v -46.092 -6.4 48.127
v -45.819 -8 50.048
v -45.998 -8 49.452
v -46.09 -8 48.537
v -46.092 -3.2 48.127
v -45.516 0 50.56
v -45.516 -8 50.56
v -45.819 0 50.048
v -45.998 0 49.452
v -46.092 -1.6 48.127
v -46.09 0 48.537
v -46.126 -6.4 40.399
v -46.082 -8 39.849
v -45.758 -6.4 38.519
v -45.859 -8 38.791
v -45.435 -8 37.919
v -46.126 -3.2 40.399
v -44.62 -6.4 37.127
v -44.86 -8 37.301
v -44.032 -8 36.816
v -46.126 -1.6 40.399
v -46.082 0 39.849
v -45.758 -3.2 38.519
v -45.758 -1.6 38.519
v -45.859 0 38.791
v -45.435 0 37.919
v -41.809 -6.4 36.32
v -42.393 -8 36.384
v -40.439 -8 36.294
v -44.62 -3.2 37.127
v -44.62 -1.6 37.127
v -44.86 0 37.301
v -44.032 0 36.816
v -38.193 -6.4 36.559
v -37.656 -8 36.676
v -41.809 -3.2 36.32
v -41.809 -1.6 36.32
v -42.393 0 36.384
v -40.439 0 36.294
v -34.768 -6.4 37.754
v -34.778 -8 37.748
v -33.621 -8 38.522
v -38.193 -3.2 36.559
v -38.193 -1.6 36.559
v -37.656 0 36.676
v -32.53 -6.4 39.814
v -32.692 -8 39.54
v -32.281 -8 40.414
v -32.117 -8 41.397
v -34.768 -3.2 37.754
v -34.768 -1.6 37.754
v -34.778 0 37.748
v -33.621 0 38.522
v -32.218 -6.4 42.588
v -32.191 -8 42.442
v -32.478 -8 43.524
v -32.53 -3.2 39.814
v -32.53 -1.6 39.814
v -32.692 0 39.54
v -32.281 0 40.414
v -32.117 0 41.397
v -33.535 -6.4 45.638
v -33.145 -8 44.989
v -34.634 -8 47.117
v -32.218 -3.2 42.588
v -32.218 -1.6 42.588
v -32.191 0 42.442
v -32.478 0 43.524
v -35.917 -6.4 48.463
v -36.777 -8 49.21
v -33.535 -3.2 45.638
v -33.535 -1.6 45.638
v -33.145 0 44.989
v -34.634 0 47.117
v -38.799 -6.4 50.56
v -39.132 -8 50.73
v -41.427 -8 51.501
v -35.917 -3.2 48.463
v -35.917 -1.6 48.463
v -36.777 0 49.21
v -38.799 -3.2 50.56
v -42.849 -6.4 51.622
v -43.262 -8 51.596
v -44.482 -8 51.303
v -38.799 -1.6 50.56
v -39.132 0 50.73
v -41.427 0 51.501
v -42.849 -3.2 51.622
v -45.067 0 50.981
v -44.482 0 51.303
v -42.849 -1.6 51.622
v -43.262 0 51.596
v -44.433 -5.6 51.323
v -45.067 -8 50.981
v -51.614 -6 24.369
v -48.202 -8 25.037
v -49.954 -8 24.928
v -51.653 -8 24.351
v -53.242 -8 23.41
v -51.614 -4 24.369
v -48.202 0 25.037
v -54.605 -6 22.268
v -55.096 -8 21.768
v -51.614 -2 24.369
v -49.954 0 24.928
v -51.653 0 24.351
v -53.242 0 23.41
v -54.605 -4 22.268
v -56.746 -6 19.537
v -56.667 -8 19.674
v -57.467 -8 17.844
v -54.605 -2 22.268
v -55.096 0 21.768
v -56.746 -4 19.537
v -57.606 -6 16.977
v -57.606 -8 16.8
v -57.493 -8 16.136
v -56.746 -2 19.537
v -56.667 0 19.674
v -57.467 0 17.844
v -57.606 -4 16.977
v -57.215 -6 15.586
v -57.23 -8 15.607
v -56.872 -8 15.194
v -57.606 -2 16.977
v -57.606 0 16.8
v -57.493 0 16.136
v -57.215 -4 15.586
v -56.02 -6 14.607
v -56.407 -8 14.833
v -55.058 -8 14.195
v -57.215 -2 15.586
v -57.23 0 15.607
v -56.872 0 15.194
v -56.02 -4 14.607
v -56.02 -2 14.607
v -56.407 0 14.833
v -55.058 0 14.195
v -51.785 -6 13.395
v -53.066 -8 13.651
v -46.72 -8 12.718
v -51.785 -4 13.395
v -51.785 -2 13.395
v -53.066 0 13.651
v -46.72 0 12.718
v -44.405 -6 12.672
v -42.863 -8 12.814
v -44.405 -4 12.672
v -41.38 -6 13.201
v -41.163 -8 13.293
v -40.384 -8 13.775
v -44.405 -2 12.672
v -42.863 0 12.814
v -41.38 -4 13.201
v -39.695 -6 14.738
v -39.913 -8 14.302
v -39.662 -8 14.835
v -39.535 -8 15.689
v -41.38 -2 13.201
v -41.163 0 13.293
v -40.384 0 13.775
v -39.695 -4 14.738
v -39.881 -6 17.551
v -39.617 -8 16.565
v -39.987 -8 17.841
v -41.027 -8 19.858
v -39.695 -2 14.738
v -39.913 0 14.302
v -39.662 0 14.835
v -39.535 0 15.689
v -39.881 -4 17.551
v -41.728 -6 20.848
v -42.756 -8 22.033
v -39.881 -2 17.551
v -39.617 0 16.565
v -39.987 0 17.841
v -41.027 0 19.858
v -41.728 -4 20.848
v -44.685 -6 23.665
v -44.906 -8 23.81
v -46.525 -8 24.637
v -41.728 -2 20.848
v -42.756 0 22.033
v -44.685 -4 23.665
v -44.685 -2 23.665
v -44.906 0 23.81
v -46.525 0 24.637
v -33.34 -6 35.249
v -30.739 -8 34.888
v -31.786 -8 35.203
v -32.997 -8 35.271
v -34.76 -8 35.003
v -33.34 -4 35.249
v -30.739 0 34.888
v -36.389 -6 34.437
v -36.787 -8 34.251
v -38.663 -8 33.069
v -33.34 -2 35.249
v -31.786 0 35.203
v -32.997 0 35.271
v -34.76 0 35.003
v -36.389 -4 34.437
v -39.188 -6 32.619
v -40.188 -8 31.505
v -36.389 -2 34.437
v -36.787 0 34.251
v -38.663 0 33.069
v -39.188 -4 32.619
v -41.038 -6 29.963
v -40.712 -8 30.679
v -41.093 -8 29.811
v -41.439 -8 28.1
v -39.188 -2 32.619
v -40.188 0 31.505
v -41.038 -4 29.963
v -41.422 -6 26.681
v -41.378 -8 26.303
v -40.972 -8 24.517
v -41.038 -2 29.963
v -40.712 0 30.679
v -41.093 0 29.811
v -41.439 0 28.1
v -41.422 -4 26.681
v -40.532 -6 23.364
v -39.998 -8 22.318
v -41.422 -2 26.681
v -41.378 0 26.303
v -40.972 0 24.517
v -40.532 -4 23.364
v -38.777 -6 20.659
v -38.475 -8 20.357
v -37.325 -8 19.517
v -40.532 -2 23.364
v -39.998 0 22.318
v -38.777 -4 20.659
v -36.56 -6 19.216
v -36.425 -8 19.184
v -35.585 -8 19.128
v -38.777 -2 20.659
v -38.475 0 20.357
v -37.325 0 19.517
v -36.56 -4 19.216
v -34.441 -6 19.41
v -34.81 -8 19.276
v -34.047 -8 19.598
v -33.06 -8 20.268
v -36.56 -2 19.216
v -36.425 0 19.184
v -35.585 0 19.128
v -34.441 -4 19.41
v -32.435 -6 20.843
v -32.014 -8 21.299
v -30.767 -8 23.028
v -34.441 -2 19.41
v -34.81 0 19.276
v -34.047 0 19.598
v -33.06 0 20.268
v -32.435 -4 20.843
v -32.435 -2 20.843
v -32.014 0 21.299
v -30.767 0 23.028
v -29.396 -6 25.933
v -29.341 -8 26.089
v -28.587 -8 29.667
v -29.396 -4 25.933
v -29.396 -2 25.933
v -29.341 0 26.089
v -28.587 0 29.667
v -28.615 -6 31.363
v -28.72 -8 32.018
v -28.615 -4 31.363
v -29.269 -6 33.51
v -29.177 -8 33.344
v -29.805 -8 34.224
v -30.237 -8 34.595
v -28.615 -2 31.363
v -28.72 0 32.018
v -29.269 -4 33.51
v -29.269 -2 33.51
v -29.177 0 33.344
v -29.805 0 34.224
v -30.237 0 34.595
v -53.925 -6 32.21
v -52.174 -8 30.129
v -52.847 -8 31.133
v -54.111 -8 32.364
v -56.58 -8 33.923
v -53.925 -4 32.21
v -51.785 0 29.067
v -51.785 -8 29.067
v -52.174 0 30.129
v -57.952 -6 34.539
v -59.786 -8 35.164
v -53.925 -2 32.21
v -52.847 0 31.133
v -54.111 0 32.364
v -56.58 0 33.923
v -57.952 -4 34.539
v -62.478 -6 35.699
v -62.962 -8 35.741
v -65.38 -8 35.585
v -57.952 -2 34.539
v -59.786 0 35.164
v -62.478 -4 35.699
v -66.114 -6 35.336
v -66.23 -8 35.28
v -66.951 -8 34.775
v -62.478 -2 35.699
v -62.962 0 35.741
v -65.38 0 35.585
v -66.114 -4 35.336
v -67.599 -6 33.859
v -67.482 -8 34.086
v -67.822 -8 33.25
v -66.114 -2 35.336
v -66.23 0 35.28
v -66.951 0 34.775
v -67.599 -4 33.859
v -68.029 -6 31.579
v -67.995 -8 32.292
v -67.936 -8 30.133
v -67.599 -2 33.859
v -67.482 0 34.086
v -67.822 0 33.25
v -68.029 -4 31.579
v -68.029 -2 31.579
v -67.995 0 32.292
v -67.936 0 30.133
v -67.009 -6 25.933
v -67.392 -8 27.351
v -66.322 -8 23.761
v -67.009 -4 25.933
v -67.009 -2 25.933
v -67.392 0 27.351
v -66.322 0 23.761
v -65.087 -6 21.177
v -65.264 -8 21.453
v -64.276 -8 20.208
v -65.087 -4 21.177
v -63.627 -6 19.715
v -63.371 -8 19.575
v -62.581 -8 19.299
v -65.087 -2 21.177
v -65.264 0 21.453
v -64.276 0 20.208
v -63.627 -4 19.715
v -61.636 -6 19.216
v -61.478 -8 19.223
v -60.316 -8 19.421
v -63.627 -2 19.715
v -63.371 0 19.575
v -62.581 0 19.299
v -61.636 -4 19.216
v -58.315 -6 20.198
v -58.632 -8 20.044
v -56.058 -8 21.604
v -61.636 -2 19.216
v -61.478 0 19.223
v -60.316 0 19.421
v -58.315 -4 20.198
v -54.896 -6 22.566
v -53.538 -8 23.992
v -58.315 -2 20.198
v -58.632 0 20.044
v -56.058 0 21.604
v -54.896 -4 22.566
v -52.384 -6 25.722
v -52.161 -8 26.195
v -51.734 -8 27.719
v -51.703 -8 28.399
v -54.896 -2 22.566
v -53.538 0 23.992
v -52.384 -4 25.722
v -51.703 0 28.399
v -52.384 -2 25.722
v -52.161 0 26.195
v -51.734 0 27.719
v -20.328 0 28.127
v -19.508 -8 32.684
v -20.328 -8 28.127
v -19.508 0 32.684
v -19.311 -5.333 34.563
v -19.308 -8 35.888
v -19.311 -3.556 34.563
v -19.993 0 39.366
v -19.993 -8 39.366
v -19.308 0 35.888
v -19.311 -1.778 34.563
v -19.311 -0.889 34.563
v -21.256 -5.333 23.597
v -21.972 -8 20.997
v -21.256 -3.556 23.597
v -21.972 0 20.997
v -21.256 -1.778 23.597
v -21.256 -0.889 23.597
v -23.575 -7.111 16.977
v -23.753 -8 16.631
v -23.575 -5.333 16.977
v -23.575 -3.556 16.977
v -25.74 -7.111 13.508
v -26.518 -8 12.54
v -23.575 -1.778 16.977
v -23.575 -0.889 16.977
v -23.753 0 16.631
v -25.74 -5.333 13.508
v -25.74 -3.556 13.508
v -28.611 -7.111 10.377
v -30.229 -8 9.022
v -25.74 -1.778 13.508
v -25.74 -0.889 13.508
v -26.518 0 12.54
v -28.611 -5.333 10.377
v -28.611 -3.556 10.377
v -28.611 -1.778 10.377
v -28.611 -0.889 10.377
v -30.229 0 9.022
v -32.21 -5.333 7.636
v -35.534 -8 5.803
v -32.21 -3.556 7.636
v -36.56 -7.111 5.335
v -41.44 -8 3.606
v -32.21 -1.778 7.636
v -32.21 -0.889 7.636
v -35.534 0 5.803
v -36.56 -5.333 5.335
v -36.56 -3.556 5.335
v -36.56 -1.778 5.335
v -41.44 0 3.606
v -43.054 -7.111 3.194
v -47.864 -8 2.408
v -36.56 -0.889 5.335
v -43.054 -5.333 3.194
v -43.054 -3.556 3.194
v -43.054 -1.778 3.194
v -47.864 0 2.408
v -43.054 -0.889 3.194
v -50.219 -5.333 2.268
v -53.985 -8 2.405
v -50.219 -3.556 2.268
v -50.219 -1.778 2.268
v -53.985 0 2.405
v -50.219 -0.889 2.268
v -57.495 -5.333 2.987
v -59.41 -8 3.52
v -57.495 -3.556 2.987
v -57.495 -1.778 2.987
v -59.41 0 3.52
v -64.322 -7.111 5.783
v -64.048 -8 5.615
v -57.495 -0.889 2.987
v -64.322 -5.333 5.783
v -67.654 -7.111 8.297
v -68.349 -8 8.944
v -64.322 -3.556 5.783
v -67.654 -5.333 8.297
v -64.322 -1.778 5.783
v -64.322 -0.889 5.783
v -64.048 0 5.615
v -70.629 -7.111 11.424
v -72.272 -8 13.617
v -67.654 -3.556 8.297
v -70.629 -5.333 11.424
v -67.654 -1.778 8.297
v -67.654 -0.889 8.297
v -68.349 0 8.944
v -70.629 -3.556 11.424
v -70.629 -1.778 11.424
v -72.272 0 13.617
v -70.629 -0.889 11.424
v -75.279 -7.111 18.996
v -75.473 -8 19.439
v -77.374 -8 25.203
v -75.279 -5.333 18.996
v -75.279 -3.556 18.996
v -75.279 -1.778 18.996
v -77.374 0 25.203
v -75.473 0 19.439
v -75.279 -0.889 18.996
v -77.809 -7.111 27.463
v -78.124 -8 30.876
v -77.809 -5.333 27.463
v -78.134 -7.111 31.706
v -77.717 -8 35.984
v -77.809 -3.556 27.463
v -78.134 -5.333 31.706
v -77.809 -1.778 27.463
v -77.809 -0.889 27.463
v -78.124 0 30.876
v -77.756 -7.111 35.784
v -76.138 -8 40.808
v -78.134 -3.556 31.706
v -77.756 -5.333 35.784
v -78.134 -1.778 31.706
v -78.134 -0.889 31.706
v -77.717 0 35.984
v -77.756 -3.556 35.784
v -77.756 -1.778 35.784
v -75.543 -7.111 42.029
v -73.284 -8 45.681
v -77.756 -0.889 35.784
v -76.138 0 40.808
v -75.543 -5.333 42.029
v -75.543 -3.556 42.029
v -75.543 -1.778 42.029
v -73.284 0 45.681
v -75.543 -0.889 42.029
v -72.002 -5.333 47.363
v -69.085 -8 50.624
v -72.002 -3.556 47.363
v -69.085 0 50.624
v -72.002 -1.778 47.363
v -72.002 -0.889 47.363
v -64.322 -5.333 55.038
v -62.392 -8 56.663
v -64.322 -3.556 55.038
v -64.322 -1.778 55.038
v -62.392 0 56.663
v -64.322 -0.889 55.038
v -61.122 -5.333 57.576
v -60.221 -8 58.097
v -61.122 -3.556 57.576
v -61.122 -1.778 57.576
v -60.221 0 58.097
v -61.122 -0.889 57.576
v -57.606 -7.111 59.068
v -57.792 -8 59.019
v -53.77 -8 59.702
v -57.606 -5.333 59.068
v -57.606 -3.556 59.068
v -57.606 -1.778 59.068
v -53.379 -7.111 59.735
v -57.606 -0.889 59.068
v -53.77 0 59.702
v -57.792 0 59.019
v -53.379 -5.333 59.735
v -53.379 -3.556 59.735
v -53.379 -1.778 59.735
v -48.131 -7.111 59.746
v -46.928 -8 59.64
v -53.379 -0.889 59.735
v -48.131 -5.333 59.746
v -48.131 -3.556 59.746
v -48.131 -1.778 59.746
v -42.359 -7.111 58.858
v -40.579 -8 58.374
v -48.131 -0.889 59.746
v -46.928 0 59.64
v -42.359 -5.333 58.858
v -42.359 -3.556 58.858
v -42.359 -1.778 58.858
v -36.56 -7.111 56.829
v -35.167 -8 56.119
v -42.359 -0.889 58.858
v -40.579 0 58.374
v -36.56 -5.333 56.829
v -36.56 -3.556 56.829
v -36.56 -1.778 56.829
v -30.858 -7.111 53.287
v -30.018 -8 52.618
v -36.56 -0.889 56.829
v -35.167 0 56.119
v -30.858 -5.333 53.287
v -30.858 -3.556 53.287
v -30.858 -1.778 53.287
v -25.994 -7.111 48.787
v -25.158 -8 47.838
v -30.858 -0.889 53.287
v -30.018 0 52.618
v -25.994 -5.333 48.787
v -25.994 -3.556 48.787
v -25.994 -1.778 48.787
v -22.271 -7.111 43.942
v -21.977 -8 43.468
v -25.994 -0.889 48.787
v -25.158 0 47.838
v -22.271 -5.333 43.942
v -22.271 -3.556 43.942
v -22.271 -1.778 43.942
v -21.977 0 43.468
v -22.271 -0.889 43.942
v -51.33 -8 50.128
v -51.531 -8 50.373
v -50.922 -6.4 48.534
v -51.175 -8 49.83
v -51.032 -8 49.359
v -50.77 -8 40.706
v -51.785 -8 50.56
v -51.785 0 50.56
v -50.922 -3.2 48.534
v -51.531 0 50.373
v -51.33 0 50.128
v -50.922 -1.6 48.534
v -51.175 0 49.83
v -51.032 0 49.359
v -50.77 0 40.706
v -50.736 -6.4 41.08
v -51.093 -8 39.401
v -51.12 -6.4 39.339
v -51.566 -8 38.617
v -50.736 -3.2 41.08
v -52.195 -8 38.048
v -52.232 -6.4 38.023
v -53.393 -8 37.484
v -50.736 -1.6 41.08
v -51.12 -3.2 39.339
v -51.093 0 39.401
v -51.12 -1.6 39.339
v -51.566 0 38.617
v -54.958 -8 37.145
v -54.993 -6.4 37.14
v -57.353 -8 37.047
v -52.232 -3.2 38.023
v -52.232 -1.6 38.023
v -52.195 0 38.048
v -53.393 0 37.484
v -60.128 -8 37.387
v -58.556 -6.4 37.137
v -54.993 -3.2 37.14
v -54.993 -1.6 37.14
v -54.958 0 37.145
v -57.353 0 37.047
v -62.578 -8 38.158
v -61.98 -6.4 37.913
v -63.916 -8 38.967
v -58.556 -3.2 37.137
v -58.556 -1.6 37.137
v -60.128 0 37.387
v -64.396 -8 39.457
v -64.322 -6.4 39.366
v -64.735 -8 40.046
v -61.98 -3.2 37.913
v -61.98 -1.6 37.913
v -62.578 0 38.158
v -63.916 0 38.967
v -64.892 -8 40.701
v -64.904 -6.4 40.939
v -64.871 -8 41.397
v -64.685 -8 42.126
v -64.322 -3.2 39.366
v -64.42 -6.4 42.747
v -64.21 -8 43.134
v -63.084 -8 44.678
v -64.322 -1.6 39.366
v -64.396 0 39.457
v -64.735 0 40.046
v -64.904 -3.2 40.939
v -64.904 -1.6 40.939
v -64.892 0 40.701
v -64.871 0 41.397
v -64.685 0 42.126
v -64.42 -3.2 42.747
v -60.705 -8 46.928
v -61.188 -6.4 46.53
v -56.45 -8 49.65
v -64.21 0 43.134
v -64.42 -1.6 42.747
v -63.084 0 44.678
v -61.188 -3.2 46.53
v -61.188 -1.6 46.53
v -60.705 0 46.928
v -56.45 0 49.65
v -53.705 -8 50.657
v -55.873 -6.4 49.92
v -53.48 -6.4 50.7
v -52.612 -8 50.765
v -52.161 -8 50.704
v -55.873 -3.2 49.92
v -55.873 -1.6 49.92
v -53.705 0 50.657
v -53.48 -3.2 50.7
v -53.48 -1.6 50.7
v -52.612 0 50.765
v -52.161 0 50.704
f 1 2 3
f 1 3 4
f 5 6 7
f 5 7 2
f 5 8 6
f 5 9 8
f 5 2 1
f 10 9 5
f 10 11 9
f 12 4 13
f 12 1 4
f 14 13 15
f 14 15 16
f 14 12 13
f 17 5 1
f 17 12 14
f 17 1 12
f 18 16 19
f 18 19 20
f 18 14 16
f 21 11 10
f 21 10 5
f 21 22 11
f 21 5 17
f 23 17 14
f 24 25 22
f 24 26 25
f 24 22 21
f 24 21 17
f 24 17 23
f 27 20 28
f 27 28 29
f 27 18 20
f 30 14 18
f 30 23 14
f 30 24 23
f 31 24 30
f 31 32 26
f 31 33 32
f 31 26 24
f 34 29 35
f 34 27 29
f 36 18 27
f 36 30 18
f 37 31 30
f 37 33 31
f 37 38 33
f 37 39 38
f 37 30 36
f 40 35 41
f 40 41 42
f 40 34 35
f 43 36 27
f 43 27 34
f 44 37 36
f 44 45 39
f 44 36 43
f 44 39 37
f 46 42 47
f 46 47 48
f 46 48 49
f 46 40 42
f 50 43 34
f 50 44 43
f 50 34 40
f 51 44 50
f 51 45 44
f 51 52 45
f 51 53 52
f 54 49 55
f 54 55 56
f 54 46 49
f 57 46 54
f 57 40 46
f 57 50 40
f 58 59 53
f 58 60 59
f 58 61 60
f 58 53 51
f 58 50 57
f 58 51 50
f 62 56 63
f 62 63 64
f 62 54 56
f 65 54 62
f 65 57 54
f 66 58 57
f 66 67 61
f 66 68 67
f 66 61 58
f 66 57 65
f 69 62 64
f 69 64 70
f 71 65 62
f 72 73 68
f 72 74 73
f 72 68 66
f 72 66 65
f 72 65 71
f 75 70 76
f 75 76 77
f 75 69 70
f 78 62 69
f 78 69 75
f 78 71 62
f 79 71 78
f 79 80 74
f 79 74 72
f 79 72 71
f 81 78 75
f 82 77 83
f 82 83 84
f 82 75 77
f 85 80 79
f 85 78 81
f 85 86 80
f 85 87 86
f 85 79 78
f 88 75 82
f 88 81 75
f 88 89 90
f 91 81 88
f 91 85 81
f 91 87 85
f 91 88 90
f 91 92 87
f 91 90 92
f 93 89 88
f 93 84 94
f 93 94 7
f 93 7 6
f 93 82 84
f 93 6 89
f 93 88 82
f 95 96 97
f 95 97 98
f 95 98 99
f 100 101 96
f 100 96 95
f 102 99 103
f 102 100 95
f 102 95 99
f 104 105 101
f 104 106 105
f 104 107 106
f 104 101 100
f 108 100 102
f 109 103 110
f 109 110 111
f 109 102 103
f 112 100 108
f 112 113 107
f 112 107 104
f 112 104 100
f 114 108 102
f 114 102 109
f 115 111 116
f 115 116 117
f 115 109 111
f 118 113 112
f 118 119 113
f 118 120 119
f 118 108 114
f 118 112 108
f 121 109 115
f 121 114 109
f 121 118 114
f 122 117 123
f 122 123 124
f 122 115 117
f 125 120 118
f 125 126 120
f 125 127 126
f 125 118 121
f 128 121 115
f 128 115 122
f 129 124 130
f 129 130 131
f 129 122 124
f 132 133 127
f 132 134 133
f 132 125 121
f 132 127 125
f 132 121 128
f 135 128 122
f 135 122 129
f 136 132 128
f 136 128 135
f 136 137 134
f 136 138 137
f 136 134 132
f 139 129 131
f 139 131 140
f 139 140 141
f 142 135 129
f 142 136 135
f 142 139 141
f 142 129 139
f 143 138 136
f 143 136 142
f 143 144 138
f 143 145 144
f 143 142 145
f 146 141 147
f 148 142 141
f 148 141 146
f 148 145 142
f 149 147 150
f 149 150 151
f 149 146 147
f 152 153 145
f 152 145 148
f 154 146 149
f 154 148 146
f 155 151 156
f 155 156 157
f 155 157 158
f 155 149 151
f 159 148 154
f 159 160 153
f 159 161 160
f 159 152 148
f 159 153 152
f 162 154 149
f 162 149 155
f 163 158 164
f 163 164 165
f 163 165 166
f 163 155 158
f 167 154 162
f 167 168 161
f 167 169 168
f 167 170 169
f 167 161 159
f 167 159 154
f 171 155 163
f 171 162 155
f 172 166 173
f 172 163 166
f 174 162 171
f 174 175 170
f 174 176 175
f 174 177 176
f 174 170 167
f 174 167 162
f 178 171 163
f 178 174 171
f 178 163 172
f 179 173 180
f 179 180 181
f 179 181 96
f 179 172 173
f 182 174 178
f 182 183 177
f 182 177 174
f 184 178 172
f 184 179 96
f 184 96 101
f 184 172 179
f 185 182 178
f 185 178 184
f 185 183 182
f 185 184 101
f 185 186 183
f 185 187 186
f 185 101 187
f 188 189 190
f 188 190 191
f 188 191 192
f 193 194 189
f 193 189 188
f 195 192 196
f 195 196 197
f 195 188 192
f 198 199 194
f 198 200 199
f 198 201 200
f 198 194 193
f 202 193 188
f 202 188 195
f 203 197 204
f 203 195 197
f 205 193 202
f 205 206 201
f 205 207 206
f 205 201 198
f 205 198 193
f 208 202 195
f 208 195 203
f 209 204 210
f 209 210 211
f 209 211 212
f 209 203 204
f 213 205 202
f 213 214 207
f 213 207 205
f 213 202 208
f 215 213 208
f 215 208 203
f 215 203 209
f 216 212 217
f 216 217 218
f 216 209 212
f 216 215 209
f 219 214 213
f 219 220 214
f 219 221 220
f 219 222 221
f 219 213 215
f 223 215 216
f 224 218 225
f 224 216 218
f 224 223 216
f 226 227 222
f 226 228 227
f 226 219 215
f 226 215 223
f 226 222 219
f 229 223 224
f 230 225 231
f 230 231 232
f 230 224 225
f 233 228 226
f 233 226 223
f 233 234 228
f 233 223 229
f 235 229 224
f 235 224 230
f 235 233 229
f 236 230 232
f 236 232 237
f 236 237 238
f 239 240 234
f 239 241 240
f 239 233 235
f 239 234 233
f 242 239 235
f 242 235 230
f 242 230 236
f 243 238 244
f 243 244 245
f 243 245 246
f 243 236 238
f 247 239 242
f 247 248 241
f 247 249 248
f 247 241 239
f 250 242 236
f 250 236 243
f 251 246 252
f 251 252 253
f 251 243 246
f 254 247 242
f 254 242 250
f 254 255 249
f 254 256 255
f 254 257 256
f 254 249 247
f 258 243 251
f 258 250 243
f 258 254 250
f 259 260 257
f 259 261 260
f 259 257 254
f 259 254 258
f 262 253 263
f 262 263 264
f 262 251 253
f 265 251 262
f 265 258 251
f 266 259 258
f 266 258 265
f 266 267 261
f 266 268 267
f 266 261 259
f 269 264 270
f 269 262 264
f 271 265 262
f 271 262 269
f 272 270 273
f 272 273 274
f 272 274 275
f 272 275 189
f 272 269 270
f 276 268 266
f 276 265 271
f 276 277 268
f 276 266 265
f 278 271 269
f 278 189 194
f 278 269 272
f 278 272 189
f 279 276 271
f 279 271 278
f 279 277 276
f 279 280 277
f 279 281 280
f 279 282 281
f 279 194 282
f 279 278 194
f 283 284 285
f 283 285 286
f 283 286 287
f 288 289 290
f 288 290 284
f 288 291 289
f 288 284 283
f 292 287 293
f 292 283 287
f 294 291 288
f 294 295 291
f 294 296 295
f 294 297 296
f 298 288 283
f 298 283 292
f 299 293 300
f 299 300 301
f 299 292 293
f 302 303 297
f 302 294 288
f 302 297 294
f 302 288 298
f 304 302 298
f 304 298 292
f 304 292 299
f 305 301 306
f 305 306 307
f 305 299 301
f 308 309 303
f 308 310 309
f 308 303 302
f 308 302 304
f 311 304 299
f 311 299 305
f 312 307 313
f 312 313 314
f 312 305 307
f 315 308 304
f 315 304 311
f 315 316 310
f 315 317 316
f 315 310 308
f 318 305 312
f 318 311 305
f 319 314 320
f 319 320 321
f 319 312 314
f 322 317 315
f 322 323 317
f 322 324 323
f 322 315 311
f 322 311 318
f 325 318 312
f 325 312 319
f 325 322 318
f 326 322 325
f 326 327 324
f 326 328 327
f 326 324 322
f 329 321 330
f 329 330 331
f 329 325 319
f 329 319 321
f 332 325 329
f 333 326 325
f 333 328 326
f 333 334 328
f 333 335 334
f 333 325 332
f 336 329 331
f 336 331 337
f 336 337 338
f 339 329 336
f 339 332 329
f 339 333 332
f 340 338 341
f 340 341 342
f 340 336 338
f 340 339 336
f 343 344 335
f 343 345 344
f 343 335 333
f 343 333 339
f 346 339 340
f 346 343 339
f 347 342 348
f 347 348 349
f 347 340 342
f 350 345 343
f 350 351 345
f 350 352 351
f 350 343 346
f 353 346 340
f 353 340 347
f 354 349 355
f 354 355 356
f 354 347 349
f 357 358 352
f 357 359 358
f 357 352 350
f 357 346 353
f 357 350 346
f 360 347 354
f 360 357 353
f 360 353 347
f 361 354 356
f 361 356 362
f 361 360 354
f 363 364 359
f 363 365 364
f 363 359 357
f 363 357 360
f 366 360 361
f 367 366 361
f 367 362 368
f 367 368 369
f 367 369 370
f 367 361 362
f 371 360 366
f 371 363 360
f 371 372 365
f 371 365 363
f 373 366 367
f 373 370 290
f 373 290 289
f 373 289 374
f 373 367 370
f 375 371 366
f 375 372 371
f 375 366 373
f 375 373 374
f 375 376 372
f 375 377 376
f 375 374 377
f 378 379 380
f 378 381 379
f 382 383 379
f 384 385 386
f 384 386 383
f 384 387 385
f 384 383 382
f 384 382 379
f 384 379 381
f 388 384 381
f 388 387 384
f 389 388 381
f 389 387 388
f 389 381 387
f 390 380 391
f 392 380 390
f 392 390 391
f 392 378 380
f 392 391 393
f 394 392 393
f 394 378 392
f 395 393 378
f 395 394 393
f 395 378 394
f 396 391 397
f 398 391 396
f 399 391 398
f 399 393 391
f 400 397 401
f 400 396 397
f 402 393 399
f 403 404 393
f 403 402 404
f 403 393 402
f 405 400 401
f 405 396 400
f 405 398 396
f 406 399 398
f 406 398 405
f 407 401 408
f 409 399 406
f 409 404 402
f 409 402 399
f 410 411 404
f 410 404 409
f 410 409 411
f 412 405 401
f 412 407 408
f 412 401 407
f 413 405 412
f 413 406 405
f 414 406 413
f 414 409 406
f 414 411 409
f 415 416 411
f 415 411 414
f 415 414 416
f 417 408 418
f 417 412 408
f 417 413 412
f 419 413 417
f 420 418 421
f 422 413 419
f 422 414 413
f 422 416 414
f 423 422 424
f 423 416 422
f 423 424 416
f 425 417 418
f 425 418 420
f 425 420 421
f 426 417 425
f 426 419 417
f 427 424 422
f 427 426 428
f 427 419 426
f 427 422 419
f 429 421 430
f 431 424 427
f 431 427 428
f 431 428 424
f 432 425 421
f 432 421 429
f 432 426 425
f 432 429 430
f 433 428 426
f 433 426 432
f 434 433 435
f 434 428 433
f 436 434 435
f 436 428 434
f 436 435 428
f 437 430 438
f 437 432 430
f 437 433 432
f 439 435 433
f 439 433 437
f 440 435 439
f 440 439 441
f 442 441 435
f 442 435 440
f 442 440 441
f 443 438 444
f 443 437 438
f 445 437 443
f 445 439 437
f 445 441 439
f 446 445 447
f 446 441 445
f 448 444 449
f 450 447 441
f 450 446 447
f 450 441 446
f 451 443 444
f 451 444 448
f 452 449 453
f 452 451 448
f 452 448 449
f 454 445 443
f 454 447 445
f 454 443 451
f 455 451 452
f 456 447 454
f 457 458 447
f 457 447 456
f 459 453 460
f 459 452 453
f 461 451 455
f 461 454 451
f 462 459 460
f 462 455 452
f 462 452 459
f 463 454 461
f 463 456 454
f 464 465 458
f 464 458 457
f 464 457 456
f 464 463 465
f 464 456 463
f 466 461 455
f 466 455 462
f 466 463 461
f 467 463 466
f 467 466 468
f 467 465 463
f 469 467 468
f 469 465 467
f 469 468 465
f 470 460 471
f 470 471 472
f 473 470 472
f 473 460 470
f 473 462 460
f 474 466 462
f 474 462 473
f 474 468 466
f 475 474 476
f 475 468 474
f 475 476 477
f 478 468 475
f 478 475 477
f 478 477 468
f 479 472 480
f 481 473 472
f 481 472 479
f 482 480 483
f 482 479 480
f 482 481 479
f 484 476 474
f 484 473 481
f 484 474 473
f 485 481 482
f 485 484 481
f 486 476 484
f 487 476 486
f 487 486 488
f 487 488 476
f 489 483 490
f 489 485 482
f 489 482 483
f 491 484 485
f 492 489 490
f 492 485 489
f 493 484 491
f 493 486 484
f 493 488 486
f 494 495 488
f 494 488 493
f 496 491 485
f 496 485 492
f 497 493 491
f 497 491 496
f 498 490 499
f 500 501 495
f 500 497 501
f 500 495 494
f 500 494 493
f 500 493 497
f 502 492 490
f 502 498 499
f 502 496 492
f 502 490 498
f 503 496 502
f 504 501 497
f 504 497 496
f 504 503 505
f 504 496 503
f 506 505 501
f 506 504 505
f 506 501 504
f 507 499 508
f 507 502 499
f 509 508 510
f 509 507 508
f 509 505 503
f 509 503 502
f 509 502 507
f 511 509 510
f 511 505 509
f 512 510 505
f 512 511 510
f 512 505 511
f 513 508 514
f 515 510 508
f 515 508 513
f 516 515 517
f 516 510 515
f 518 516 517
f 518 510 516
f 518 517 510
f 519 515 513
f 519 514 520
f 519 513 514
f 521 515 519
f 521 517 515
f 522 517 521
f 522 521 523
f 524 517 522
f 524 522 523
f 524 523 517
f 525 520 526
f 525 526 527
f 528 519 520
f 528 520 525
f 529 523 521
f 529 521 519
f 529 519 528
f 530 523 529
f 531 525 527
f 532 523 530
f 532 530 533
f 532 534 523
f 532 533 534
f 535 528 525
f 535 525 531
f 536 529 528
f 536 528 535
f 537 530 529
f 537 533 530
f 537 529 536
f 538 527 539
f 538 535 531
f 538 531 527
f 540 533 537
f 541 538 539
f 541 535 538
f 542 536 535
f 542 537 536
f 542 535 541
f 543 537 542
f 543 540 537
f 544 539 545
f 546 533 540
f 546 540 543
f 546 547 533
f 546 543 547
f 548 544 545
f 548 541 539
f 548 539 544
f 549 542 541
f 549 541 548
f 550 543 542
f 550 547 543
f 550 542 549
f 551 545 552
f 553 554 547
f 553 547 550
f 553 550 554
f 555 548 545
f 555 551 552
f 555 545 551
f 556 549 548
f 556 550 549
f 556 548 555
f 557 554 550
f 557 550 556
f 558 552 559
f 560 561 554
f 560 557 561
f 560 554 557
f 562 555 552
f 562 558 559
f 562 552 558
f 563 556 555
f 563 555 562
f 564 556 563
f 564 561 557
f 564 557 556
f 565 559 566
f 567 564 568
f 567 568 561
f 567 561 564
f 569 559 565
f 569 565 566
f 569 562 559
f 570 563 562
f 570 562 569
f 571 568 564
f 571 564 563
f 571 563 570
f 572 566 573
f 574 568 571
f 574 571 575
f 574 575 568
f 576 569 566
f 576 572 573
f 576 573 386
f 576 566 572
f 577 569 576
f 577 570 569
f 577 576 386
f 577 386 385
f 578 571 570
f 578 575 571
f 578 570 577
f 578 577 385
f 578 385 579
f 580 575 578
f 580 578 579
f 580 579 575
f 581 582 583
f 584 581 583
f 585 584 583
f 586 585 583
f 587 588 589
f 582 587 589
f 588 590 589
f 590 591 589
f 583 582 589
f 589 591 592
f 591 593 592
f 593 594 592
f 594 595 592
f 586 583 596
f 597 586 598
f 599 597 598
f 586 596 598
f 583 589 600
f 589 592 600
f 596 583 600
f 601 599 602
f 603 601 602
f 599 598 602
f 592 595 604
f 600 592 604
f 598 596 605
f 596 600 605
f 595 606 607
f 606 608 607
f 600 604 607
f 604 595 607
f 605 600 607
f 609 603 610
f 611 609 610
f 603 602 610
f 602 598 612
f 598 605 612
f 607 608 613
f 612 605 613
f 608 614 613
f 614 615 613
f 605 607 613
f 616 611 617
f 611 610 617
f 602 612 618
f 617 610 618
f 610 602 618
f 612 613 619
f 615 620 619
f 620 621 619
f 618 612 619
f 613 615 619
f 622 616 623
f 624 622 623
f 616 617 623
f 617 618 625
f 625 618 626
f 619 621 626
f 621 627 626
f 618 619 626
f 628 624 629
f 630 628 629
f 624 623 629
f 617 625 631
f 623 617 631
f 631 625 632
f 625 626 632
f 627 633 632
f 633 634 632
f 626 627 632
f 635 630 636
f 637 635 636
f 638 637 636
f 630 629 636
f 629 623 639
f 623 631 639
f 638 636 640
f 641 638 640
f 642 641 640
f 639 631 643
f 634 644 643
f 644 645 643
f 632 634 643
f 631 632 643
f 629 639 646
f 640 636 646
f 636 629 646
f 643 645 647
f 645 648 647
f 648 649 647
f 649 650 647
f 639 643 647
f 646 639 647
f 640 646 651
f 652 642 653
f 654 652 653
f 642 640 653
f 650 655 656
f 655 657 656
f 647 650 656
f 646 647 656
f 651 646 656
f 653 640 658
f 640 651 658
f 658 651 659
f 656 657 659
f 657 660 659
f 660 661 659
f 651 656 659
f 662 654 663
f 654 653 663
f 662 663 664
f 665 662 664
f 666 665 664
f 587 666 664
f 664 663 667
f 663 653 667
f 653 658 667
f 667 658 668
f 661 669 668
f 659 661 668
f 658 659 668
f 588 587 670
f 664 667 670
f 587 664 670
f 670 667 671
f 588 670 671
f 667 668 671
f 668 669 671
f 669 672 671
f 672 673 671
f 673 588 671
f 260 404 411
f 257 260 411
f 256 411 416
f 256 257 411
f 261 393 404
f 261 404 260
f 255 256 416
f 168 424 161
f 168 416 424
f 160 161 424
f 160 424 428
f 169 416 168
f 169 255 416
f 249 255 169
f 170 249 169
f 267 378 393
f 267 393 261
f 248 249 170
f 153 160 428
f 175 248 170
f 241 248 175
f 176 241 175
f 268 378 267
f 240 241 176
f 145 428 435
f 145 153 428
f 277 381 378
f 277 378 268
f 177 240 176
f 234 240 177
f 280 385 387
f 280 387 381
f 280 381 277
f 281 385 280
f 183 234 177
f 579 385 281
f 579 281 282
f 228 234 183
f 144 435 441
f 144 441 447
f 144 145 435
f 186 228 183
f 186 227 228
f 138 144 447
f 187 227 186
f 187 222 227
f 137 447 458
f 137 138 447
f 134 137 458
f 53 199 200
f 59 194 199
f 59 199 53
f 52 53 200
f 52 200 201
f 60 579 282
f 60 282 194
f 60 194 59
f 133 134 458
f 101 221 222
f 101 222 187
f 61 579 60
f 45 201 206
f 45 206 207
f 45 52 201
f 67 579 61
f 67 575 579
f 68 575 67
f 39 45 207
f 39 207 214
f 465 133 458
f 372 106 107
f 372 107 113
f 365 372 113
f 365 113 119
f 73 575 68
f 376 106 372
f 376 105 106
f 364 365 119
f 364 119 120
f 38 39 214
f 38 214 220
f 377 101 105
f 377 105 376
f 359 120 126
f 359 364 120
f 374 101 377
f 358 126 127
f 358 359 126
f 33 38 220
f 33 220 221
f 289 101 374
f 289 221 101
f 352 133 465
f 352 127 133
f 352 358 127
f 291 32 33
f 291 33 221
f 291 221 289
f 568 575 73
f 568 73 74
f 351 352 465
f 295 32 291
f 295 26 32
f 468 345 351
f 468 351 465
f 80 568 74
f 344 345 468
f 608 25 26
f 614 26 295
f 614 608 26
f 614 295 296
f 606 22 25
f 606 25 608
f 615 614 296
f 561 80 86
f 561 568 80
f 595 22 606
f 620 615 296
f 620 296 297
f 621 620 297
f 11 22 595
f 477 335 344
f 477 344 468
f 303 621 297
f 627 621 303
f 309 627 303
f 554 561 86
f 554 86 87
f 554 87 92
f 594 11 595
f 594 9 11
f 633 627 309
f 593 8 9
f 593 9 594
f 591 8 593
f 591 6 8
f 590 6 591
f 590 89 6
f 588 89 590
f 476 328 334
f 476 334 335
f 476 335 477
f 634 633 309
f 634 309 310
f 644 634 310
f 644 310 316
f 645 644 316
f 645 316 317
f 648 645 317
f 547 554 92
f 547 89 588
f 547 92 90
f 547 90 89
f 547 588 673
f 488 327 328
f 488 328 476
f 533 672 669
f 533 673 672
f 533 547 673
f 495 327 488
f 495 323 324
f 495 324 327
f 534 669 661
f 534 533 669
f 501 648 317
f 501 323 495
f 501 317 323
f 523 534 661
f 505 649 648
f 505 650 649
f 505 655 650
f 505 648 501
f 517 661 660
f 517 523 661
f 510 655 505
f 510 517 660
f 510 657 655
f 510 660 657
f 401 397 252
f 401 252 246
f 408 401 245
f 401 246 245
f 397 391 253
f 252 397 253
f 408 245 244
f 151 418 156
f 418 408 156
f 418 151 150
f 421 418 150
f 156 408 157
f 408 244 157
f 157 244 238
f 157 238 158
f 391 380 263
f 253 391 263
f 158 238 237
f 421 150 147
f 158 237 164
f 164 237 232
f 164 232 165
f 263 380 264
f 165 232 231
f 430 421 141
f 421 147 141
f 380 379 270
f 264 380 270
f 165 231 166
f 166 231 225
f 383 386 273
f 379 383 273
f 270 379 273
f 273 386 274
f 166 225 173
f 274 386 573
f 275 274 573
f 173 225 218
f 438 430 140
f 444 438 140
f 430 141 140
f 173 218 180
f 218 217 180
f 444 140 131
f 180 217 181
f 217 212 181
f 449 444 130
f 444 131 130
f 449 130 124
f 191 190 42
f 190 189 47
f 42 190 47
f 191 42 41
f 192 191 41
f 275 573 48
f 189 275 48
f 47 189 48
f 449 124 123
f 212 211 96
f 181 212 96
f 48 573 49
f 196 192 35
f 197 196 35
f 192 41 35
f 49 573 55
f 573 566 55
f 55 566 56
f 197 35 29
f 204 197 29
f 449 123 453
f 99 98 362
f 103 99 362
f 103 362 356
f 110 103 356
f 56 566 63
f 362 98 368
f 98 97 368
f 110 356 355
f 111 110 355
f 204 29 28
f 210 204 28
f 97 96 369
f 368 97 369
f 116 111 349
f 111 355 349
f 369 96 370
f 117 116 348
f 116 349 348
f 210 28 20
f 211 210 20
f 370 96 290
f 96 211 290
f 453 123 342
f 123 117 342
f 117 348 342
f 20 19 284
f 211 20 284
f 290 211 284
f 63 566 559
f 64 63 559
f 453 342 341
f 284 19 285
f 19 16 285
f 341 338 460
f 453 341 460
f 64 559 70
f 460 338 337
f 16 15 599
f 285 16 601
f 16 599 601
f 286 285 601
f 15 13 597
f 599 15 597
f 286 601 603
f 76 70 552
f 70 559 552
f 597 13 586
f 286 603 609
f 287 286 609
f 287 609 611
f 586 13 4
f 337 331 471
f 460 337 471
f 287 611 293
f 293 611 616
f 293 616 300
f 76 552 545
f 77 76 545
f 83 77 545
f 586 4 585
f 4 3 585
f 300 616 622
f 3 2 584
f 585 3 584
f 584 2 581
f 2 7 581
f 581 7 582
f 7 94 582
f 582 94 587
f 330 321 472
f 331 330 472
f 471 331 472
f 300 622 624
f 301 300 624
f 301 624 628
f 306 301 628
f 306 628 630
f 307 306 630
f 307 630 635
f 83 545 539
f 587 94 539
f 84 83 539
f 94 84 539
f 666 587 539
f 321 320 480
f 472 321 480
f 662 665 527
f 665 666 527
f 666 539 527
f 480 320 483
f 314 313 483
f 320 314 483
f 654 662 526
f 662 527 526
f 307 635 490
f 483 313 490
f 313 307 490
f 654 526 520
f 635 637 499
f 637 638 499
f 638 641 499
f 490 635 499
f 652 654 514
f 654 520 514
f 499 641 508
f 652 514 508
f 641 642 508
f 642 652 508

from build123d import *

# Parameters (mm, degrees)
F1_DEPTH = 8


with BuildPart() as f1:
    # F0 (on Front) → F1 (new body)
    with BuildSketch(Plane.XZ):
        with BuildLine():
            add(Edge.make_bspline(
                [(-19.9926439673, 39.365850389), (-18.7797711252, 35.8352207647), (-20.112754659, 30.0998025239), (-22.2669997346, 15.7173730294), (-35.6107045451, 2.961458872), (-68.0028217066, -1.0295733326), (-84.9285930277, 36.8185652771), (-64.2523509468, 55.1809745621), (-58.2175439834, 60.2184968115), (-34.7193167619, 60.5236310992), (-21.9332176227, 45.0147911506), (-19.9926439673, 39.365850389)],
                knots=[0, 0, 0, 0, 0.0784941342, 0.172442609, 0.2793416844, 0.4142229512, 0.560981909, 0.6850103373, 0.756650718, 0.8744108669, 1, 1, 1, 1], degree=3))
        make_face()
        with BuildLine():
            add(Edge.make_bspline(
                [(-51.784709096, 29.0670134127), (-52.762626018, 33.6435454992), (-70.0256050177, 39.5937843311), (-67.2912118698, 25.6279831221), (-63.1096405141, 15.0805858276), (-50.8617535608, 24.747693923), (-51.784709096, 29.0670134127)],
                knots=[0, 0, 0, 0, 0.2888058688, 0.5132488715, 0.7274257464, 1, 1, 1, 1], degree=3))
        make_face(mode=Mode.SUBTRACT)
        with BuildLine():
            add(Edge.make_bspline(
                [(-48.2024997473, 25.037035346), (-52.8415826498, 25.4577249411), (-60.9661972575, 15.8054430055), (-51.9874539554, 13.0322561643), (-34.0163826309, 11.1858625755), (-43.3845283061, 24.6001234612), (-48.2024997473, 25.037035346)],
                knots=[0, 0, 0, 0, 0.2650757307, 0.461997399, 0.7247026347, 1, 1, 1, 1], degree=3))
        make_face(mode=Mode.SUBTRACT)
        with BuildLine():
            add(Edge.make_bspline(
                [(-30.7392608374, 34.8880961537), (-33.598528064, 36.2270723655), (-45.4857815141, 31.7260778295), (-36.9452340139, 14.6066249106), (-27.94148211, 25.4665560849), (-28.1926811704, 33.6955494887), (-30.7392608374, 34.8880961537)],
                knots=[0, 0, 0, 0, 0.2612342961, 0.525042644, 0.7673341125, 1, 1, 1, 1], degree=3))
        make_face(mode=Mode.SUBTRACT)
        with BuildLine():
            add(Edge.make_bspline(
                [(-51.784709096, 50.5602397025), (-50.6019570288, 49.9014717969), (-51.3867830894, 44.9519674422), (-49.2459977631, 35.5904414496), (-68.2552586255, 37.6677382901), (-61.887710273, 47.3960353101), (-53.4055702392, 51.4630251045), (-51.784709096, 50.5602397025)],
                knots=[0, 0, 0, 0, 0.1607803737, 0.3467658533, 0.5870259151, 0.7796641684, 1, 1, 1, 1], degree=3))
        make_face(mode=Mode.SUBTRACT)
        with BuildLine():
            add(Edge.make_bspline(
                [(-45.5158501863, 50.5602397025), (-46.4856466264, 49.3513622372), (-45.2962380546, 44.7709613812), (-47.8323369552, 34.3528785071), (-26.6905593357, 37.749001098), (-37.8834002713, 52.4168513322), (-44.4756572259, 51.8568683324), (-45.5158501863, 50.5602397025)],
                knots=[0, 0, 0, 0, 0.1628795619, 0.3502963055, 0.5875263068, 0.8252971792, 1, 1, 1, 1], degree=3))
        make_face(mode=Mode.SUBTRACT)
    extrude(amount=F1_DEPTH)


solid = f1.part
